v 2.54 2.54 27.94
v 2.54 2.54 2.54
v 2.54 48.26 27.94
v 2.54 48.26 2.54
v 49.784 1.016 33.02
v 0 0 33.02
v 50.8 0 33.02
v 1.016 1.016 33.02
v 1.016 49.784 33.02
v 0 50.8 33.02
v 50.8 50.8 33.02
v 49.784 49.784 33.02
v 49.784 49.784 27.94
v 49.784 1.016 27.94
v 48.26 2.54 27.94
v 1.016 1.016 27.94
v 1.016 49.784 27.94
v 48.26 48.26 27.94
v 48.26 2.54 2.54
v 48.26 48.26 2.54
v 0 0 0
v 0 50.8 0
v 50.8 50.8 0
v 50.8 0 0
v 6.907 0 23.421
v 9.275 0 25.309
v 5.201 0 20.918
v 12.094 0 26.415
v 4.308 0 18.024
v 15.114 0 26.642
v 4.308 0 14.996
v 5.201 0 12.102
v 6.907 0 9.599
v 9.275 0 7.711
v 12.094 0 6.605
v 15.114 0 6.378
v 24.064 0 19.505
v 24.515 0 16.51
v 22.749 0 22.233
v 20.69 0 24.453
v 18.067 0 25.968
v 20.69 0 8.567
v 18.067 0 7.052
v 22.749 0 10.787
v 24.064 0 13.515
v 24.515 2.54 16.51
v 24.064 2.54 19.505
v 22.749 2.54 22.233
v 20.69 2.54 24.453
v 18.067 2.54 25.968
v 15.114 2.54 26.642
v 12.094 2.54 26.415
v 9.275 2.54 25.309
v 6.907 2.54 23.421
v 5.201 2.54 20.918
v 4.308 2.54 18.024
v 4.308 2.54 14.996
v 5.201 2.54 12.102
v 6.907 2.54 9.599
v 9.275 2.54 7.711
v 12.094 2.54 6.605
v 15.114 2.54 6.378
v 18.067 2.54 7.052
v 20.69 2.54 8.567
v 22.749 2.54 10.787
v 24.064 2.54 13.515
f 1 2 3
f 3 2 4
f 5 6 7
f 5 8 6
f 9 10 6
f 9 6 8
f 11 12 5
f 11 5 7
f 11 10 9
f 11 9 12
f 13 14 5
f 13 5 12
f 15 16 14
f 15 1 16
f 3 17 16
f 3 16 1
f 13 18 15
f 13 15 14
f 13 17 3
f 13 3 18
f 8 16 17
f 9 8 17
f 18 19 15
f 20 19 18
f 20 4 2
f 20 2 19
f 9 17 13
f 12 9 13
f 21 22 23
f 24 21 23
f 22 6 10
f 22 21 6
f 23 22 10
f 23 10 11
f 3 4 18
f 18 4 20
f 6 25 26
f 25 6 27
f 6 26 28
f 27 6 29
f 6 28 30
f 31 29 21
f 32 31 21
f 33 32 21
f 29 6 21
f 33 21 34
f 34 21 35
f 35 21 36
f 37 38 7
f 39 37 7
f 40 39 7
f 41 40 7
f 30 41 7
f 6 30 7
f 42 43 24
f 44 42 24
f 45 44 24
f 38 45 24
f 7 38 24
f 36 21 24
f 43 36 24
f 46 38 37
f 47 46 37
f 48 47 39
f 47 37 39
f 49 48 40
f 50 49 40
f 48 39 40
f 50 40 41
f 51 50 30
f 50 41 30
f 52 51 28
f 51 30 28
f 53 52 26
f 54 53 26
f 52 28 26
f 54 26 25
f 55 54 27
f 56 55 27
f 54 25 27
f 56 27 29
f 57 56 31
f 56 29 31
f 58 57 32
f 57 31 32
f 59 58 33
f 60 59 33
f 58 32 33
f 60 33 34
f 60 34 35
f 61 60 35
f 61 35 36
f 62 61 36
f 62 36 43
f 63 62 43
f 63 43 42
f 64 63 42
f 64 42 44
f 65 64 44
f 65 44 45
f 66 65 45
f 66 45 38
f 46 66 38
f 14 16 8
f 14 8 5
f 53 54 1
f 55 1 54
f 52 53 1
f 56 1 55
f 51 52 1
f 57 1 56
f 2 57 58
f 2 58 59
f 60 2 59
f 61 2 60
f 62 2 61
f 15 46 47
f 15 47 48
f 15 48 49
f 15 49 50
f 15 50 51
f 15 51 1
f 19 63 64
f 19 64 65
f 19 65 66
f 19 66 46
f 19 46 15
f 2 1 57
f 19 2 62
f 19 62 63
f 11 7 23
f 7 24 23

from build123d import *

# Parameters (mm, degrees)
F0_W     = 50.8
F0_H     = 50.8
F1_DEPTH = 2.54
F2_W     = 50.8
F2_H     = 50.8
F2_W_2   = 48.768
F2_H_2   = 48.768
F3_DEPTH = 30.48
F4_W     = 50.8
F4_H     = 50.8
F4_W_2   = 48.768
F4_H_2   = 48.768
F4_W_3   = 45.72
F4_H_3   = 45.72
F5_DEPTH = 25.4
F6_R     = 10.16
F7_DEPTH = 25.4


with BuildPart() as f1:
    # F0 (on Top) → F1 (new body)
    with BuildSketch(Plane.XY):
        with Locations((25.4, 25.4)):
            Rectangle(F0_W, F0_H)
    extrude(amount=F1_DEPTH)

    # F2 (on face) → F3 (join)
    with BuildSketch(Plane.XY.offset(2.54)):
        with Locations((25.4, 25.4)):
            Rectangle(F2_W, F2_H)
        with Locations((25.4, 25.4)):
            Rectangle(F2_W_2, F2_H_2, mode=Mode.SUBTRACT)
    extrude(amount=F3_DEPTH)

    # F4 (on face) → F5 (join)
    with BuildSketch(Plane.XY.offset(2.54)):
        with Locations((25.4, 25.4)):
            Rectangle(F4_W, F4_H)
        with Locations((25.4, 25.4)):
            Rectangle(F4_W_2, F4_H_2, mode=Mode.SUBTRACT)
        with Locations((25.4, 25.4)):
            Rectangle(F4_W_2, F4_H_2)
        with Locations((25.4, 25.4)):
            Rectangle(F4_W_3, F4_H_3, mode=Mode.SUBTRACT)
    extrude(amount=F5_DEPTH)

    # F6 (on face) → F7 (cut)
    with BuildSketch(Plane.XZ):
        with Locations((14.354912, 16.51)):
            Circle(F6_R)
    extrude(amount=-F7_DEPTH, mode=Mode.SUBTRACT)


solid = f1.part
